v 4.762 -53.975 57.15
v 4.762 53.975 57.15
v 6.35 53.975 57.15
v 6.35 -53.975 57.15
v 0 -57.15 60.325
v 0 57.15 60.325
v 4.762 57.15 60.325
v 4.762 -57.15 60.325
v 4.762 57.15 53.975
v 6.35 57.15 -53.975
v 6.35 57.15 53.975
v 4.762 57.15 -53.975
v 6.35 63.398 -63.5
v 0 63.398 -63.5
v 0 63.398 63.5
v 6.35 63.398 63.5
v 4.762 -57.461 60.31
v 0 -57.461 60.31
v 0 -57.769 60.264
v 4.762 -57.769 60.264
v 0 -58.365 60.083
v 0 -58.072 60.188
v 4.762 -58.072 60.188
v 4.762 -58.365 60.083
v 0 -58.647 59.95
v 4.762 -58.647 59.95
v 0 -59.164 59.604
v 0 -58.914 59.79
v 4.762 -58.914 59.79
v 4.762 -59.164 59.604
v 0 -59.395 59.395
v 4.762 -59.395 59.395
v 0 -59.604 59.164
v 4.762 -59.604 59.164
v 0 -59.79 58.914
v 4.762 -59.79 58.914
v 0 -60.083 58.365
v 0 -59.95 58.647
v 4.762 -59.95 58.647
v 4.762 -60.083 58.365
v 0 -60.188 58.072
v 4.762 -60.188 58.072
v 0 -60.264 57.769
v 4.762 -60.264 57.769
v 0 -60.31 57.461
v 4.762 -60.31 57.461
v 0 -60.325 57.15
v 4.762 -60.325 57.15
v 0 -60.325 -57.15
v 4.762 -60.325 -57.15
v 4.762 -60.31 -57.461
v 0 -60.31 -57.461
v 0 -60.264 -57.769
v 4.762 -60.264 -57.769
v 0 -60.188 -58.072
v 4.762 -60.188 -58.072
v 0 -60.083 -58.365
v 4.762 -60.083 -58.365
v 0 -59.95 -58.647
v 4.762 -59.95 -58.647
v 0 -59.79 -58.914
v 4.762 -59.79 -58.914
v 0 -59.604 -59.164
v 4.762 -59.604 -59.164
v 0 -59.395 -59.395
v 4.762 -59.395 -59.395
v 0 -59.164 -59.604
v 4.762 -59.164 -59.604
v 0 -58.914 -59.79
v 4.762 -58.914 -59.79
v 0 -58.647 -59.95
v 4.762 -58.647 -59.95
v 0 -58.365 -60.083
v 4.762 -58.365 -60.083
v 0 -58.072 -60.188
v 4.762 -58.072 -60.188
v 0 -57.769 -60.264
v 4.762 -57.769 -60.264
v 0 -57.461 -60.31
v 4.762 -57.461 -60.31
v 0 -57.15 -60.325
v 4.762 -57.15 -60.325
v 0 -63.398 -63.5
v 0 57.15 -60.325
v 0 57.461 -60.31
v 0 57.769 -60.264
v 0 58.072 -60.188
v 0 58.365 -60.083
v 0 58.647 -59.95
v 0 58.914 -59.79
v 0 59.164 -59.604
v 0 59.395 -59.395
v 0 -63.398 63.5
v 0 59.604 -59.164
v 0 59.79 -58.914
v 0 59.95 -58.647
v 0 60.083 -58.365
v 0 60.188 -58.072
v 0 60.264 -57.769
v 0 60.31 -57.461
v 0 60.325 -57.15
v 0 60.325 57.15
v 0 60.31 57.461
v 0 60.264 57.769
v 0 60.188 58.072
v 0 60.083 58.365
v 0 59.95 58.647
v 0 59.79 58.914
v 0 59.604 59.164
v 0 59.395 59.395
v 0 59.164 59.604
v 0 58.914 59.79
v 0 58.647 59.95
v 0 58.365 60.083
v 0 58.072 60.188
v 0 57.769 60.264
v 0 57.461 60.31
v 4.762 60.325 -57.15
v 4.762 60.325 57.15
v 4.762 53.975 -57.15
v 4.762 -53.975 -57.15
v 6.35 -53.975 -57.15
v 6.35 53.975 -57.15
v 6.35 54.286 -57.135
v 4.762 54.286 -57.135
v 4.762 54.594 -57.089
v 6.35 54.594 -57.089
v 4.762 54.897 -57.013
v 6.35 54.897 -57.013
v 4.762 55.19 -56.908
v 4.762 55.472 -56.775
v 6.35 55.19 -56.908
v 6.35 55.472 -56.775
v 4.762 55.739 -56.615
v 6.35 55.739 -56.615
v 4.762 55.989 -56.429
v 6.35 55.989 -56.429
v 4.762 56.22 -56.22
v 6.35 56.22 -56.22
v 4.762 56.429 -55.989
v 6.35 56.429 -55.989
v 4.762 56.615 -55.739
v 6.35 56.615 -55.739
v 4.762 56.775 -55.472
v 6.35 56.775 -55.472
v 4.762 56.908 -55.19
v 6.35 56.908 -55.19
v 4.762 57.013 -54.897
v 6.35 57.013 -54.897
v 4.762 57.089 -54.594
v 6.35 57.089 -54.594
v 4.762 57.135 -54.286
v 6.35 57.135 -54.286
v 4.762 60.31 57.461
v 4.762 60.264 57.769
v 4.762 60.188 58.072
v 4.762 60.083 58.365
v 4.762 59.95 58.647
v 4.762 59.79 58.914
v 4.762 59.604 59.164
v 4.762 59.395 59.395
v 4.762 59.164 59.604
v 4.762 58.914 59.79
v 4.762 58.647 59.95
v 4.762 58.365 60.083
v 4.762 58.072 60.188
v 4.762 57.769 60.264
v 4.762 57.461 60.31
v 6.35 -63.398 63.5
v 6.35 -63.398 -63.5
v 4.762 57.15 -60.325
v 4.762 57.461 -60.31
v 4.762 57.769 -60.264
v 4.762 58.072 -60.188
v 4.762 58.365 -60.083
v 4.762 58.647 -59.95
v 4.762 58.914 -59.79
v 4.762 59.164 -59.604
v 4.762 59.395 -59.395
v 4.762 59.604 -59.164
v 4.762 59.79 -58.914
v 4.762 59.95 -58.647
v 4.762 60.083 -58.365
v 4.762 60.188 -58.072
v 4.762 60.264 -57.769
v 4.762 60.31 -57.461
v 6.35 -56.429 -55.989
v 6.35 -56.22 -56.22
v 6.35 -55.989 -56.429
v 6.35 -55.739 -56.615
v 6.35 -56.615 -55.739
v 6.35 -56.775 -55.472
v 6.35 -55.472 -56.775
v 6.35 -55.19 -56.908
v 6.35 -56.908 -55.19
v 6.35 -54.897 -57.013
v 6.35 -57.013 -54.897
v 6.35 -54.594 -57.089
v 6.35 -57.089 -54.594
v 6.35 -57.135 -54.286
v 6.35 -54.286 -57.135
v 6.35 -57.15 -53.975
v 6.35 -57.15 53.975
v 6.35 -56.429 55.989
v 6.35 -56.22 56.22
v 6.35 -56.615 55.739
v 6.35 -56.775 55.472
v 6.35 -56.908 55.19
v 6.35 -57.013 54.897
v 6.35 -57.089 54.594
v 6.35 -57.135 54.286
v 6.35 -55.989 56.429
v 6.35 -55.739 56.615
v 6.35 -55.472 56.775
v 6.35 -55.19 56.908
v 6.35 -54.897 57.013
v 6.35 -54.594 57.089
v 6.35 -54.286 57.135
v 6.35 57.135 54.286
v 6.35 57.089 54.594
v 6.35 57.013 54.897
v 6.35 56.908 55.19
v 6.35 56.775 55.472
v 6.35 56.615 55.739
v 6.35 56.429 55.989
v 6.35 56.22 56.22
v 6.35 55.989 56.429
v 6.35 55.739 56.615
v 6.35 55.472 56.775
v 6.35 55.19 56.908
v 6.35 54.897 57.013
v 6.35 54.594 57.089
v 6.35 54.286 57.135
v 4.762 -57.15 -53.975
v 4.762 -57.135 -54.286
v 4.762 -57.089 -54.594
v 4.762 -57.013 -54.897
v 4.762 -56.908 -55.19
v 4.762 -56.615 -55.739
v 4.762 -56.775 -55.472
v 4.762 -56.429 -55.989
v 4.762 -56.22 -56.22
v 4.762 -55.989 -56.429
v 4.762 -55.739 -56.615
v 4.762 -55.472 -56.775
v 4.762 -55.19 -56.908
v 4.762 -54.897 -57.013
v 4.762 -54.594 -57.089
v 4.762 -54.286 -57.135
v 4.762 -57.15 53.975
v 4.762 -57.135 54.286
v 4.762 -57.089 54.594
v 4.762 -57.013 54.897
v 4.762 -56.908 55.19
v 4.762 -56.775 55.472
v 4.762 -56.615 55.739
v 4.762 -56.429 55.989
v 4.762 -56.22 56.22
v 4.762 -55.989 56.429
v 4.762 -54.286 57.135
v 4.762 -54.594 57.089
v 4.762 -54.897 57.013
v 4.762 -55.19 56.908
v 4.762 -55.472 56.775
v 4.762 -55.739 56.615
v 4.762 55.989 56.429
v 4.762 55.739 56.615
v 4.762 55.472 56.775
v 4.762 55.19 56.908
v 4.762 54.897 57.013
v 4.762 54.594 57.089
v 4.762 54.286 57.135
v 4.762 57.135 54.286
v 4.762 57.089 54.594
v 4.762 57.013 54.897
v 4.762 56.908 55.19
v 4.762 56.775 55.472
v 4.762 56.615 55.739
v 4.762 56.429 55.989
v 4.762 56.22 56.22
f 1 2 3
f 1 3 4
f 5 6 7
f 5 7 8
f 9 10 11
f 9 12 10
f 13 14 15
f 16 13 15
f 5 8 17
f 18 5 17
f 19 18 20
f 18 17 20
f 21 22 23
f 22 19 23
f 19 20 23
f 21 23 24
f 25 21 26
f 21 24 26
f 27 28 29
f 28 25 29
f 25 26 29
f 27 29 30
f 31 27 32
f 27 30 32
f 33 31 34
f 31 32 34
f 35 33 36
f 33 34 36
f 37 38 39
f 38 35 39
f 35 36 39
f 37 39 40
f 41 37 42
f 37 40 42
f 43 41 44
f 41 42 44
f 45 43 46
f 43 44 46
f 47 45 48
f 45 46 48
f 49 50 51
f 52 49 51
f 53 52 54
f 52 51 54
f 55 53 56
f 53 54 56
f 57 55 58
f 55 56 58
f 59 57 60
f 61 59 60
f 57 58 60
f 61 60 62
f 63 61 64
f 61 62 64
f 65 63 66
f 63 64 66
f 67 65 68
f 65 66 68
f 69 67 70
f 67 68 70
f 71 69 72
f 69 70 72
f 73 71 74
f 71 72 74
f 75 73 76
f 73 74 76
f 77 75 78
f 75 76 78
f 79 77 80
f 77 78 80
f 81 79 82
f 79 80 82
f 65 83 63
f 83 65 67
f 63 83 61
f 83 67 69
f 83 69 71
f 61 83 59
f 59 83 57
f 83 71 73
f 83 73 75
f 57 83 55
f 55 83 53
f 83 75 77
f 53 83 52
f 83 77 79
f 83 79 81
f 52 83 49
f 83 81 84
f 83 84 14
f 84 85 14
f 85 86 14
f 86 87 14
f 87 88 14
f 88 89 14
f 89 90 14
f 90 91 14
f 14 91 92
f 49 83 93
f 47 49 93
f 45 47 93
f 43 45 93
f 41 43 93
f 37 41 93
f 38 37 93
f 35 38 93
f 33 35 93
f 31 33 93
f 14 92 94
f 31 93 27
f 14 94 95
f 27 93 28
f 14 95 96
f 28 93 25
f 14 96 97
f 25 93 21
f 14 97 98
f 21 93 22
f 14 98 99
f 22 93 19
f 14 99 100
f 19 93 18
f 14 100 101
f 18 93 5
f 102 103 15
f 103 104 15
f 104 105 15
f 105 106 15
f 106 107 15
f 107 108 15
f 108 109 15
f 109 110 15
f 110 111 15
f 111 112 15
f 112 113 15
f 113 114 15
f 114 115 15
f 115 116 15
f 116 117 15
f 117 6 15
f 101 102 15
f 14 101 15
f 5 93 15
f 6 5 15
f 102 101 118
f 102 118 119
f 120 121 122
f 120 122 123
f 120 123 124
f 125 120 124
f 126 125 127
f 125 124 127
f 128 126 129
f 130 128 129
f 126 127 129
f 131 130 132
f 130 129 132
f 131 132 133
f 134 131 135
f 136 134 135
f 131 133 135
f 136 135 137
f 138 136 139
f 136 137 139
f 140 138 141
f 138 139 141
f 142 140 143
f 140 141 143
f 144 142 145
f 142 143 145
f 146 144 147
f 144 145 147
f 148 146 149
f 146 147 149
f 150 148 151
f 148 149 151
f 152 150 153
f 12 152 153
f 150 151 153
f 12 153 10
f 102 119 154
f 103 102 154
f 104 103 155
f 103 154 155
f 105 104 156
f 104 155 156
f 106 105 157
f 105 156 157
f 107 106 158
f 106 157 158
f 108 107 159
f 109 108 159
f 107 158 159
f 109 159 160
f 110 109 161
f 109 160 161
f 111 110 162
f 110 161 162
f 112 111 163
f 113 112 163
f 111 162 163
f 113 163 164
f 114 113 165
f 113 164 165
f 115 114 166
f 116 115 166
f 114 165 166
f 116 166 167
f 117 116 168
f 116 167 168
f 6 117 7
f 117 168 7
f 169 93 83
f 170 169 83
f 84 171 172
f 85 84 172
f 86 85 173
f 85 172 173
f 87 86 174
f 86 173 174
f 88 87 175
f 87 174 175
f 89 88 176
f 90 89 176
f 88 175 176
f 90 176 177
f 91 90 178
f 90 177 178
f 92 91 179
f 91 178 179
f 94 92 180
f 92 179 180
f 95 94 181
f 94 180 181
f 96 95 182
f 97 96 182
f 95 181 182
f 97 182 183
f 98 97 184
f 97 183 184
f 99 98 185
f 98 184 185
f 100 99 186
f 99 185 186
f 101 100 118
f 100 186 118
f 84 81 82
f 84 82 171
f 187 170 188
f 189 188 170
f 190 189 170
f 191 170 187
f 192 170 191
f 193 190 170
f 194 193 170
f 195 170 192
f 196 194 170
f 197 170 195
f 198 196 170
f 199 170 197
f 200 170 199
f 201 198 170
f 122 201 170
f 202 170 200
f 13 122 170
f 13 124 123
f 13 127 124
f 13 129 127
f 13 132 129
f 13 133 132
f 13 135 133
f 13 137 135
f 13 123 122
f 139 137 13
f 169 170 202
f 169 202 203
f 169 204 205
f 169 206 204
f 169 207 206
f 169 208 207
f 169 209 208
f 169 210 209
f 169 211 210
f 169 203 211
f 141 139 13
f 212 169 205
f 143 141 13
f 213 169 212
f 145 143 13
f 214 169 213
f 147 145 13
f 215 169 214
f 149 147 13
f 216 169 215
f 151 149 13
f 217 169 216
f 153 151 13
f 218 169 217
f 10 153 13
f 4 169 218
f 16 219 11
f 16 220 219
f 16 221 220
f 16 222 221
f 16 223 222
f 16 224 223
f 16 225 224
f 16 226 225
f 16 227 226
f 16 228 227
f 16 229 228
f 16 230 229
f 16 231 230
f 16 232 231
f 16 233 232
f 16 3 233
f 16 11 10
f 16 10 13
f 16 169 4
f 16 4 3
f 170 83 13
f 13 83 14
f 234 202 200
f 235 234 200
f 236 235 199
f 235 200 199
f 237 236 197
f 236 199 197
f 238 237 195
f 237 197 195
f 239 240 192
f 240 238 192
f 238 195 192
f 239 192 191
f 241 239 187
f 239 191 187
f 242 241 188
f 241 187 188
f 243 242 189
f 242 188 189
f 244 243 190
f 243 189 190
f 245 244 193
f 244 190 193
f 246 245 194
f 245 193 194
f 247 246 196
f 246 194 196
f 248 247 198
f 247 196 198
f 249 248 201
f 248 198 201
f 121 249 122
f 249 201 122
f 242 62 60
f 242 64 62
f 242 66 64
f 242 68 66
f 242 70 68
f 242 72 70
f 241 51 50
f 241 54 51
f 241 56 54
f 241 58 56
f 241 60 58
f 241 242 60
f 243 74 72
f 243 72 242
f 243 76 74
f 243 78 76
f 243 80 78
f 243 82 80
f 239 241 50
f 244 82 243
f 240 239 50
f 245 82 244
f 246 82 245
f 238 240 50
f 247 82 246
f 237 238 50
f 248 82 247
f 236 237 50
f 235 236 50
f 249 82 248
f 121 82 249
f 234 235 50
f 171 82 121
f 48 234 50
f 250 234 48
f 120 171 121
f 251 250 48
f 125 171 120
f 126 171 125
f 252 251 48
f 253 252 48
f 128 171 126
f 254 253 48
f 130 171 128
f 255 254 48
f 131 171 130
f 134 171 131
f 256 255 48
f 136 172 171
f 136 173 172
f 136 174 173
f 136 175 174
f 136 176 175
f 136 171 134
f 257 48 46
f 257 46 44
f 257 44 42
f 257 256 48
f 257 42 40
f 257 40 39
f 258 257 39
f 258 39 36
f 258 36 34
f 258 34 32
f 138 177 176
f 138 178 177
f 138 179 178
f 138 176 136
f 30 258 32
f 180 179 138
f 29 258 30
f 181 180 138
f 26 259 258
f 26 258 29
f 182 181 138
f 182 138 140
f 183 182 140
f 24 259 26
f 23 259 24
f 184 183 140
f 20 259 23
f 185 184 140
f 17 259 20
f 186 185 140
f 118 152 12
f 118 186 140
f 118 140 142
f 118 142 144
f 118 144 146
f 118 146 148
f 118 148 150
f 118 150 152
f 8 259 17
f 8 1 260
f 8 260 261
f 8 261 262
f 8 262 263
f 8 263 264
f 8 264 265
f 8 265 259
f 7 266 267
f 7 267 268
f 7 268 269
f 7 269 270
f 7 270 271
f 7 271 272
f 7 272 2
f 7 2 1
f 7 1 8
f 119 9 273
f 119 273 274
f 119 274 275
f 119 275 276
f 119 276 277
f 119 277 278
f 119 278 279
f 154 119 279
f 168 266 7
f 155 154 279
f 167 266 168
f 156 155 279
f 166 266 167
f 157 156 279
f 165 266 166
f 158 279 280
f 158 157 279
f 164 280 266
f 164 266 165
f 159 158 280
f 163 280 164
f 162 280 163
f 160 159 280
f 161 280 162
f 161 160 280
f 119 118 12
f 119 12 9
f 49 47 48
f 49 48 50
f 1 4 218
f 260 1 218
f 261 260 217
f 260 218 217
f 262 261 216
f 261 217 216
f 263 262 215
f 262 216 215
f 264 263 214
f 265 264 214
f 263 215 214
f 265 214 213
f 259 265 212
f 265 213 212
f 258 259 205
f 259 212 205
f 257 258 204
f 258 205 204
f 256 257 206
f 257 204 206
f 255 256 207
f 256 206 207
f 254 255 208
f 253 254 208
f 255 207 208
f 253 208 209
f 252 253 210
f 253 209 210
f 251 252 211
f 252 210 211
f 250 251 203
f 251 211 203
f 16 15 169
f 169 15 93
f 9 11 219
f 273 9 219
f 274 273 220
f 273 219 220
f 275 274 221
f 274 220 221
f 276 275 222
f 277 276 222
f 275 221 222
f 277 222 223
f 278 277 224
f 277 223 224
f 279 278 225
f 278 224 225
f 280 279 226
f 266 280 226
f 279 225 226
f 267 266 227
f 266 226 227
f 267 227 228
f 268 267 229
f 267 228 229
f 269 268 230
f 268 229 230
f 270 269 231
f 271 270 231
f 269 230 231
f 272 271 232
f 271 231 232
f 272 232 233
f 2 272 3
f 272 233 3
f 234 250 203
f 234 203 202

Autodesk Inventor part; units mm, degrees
ref_plane "YZ Plane" through (0, 0, 0) normal (1, 0, 0) x (0, 1, 0)
ref_plane "XZ Plane" through (0, 0, 0) normal (0, 1, 0) x (-1, 0, 0)
ref_plane "XY Plane" through (0, 0, 0) normal (0, 0, 1) x (1, 0, 0)
sketch "Sketch1" plane through (0, 0, 0) normal (1, 0, 0) x (0, 1, 0)
  line L0 (-63.3984, -63.5) -> (63.3984, -63.5)
  line L1 (63.3984, -63.5) -> (63.3984, 63.5)
  line L2 (63.3984, 63.5) -> (-63.3984, 63.5)
  line L3 (-63.3984, 63.5) -> (-63.3984, -63.5)
  line L4 (-63.3984, -63.5) -> (63.3984, 63.5) construction
  line L5 (63.3984, -63.5) -> (-63.3984, 63.5) construction
  point P0 (0, 0)
  dimension "d0" = 126.7968
  dimension "d1" = 127
extrude "Extrusion1" add sketch "Sketch1" along normal blind 6.35
sketch "Sketch2" plane through (0, 0, 0) normal (-1, 0, 0) x (0, 0, 1)
  line L0 (60.325, -60.325) -> (-60.325, -60.325)
  line L1 (-60.325, -60.325) -> (-60.325, 60.325)
  line L2 (-60.325, 60.325) -> (60.325, 60.325)
  line L3 (60.325, 60.325) -> (60.325, -60.325)
  line L4 (60.325, -60.325) -> (-60.325, 60.325) construction
  line L5 (-60.325, -60.325) -> (60.325, 60.325) construction
  line L6 (-63.5, -63.3984) -> (-63.5, 63.3984) projected
  line L7 (63.5, -63.3984) -> (-63.5, -63.3984) projected
  line L8 (63.5, 63.3984) -> (63.5, -63.3984) projected
  line L9 (-63.5, 63.3984) -> (63.5, 63.3984) projected
  line L10 (63.5, 63.3984) -> (-63.5, -63.3984)
  line L11 (63.5, -63.3984) -> (-63.5, -63.3984) projected
  line L12 (-63.5, 63.3984) -> (63.5, -63.3984)
  point P0 (0, 0)
  point P1 (0, 0)
  point P2 (0, 0)
  dimension "d4" = 120.65
  dimension "d5" = 120.65
extrude "Extrusion2" cut sketch "Sketch2" against normal blind 4.7625 contours L0 L1 L10 L12 L3 | L12 L10 L3 | L1 L12 L10 | L10 L12 L1 L2 L3
sketch "Sketch3" plane through (4.7625, 0, 0) normal (-1, 0, 0) x (0, 0, 1)
  line L0 (57.15, -57.15) -> (-57.15, -57.15)
  line L1 (-57.15, -57.15) -> (-57.15, 57.15)
  line L2 (-57.15, 57.15) -> (57.15, 57.15)
  line L3 (57.15, 57.15) -> (57.15, -57.15)
  line L4 (57.15, -57.15) -> (-57.15, 57.15) construction
  line L5 (-57.15, -57.15) -> (57.15, 57.15) construction
  point P0 (0, 0)
  dimension "d8" = 114.3
  dimension "d9" = 114.3
extrude "Extrusion3" cut sketch "Sketch3" against normal through all
fillet "Fillet1" radius 3.175 8 edges at (2.3813, -60.325, -60.325) (5.5563, -57.15, -57.15) (5.5563, 57.15, 57.15) (5.5563, 57.15, -57.15) (5.5563, -57.15, 57.15) (2.3813, 60.325, 60.325) (2.3813, 60.325, -60.325) (2.3813, -60.325, 60.325)
equation "\"d0\" = width - 2 * alignmentGrooveClearance"
equation "\"d1\" = height"
equation "\"d2\" = plasticThickness"
equation "\"d4\" = height - caseThickness"
equation "\"d5\" = width - caseThickness"
equation "\"d8\" = -caseThickness + height - 2 * mirrorThickness"
equation "\"d9\" = -caseThickness + width - 2 * mirrorThickness"
equation "\"frameAcrylicThickness\" = 9.525"
equation "\"internalAcrylicThickness\" = 6.35"
equation "\"height\" = 127"
equation "\"width\" = 127"
equation "\"depth\" = 203.2"
equation "\"mirrorAngle\" = 2.5deg"
equation "\"detectorWidth\" = 52"
equation "\"detectorHeight\" = 52"
equation "\"mirrorThickness\" = 3.175"
equation "\"fresnelThickness\" = 0.254"
equation "\"focalLength\" = 152.4"
equation "\"ior\" = 1.49"
equation "\"centerThickness\" = 1.27"
equation "\"fresnelAngle\" = 90deg"
equation "\"fresnelEffectiveDiameter\" = 152.4"
equation "\"oRingWidth\" = 1.5875"
equation "\"sensorHolderDepth\" = 19.05"
equation "\"aerogelClearence\" = 3.175"
equation "\"backplanePCBWidth\" = 76.2"
equation "\"backplanePCBHeight\" = 76.2"
equation "\"backplaneHoleOffsett\" = 6.35"
equation "\"backplanePostionOffsett\" = 12.7"
equation "\"moduleSlotClearence\" = 0.79375"
equation "\"aerogelHolderDepth\" = 49.022"
equation "\"plasticThickness\" = 6.35"
equation "\"caseThickness\" = 6.35"
equation "\"alignmantGrooveDepth\" = 1.5875"
equation "\"alignmentGrooveDepth\" = 1.5875"
equation "\"alignmentGrooveClearance\" = 0.1016"
equation "\"frontPanelThickness\" = 1.5875"
equation "\"fresnelGrooveWidth\" = 1.778"
properties part number "mirrorFrontFrame" material "ABS Plastic"
